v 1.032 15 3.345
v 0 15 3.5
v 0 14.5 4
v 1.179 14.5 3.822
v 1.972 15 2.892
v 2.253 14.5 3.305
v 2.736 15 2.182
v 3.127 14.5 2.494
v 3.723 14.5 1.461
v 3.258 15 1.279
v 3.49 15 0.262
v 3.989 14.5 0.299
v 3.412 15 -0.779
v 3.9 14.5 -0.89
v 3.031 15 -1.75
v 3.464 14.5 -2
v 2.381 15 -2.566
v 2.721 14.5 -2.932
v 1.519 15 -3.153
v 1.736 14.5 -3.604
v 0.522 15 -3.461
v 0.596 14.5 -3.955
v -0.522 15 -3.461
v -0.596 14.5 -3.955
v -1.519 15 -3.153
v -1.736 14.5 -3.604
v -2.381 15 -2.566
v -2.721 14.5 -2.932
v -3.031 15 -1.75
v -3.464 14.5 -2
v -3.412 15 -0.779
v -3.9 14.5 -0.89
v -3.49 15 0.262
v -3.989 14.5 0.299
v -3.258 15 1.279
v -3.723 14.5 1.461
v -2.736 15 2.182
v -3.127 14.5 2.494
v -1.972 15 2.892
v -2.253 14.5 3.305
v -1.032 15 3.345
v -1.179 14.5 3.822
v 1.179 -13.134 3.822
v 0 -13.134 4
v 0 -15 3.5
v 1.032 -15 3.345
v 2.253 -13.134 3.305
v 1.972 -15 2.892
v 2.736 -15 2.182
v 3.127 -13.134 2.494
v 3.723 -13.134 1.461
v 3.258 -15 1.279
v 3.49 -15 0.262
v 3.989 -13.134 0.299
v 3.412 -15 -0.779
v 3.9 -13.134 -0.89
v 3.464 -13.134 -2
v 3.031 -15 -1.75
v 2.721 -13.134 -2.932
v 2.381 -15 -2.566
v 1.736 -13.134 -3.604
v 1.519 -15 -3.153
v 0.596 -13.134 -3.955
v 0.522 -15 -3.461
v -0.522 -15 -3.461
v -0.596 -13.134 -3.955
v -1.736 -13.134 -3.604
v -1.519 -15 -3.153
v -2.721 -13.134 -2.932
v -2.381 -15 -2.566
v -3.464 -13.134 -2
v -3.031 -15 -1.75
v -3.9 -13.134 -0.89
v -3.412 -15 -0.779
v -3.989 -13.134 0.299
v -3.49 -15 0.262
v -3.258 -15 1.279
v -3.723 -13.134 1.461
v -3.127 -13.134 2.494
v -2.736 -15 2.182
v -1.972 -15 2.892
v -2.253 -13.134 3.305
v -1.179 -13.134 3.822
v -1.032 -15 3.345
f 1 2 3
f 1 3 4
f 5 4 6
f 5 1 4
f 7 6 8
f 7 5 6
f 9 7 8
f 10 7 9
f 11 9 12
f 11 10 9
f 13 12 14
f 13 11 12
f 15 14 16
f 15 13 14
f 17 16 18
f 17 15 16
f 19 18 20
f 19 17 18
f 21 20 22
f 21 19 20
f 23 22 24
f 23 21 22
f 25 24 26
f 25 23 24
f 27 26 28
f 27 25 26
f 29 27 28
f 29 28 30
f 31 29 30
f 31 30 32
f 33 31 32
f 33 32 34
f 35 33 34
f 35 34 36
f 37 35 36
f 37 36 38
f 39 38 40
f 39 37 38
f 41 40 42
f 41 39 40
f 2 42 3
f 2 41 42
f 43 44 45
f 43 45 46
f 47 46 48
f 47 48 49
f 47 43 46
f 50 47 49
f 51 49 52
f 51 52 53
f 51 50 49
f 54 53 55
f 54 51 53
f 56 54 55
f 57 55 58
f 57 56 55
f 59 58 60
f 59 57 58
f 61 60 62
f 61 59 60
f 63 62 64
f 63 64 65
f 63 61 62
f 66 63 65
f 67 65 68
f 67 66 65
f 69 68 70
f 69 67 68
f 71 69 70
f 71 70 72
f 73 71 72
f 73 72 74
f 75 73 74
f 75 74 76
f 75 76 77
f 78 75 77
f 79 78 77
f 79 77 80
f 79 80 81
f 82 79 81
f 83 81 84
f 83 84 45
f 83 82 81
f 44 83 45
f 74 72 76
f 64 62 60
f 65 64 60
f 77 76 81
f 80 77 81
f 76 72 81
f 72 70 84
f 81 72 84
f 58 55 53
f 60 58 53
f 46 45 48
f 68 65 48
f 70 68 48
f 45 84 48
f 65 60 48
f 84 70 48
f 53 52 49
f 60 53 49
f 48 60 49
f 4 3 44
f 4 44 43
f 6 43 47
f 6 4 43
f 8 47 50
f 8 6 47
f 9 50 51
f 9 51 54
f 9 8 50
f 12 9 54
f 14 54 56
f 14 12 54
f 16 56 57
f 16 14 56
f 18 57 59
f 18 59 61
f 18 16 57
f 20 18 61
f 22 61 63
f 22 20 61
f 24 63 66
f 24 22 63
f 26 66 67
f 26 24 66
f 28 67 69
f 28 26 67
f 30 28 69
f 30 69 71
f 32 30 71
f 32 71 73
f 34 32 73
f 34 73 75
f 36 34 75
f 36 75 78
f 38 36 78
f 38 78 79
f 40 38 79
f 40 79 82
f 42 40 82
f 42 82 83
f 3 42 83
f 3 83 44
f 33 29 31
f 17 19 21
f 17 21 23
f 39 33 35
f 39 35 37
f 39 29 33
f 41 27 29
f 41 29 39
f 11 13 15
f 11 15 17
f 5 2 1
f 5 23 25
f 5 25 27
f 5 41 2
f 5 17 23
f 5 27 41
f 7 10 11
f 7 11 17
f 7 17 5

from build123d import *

# Parameters (mm, degrees)
SKETCH_1_R      = 4
EXTRUDE_1_DEPTH = 15
CHAMFER_1_SIZE  = 0.5
CHAMFER_2_SIZE  = 0.5
CHAMFER_2_SIZE2 = 1.866025404


with BuildPart() as part:
    # 草圖1 → 伸長1 (new, symmetric)
    with BuildSketch(Plane(origin=(0, 0, 0), x_dir=(1, 0, 0), z_dir=(0, 1, 0))):
        with Locations(Location((0, 0, 0), (0, 0, 270))):
            Circle(SKETCH_1_R)
    extrude(amount=EXTRUDE_1_DEPTH, both=True)

    # 導角1
    chamfer_1_edges = [part.edges().sort_by_distance(p)[0] for p in [
        (0, 15, -4),
    ]]
    chamfer(chamfer_1_edges, length=CHAMFER_1_SIZE)

    # 導角2
    chamfer_2_edges = [part.edges().sort_by_distance(p)[0] for p in [
        (0, -15, -4),
    ]]
    chamfer_2_side = [part.faces().sort_by_distance(p)[0] for p in [
        (0, -15, 0),
    ]]
    chamfer(chamfer_2_edges, length=CHAMFER_2_SIZE, length2=CHAMFER_2_SIZE2, reference=chamfer_2_side[0])


solid = part.part
